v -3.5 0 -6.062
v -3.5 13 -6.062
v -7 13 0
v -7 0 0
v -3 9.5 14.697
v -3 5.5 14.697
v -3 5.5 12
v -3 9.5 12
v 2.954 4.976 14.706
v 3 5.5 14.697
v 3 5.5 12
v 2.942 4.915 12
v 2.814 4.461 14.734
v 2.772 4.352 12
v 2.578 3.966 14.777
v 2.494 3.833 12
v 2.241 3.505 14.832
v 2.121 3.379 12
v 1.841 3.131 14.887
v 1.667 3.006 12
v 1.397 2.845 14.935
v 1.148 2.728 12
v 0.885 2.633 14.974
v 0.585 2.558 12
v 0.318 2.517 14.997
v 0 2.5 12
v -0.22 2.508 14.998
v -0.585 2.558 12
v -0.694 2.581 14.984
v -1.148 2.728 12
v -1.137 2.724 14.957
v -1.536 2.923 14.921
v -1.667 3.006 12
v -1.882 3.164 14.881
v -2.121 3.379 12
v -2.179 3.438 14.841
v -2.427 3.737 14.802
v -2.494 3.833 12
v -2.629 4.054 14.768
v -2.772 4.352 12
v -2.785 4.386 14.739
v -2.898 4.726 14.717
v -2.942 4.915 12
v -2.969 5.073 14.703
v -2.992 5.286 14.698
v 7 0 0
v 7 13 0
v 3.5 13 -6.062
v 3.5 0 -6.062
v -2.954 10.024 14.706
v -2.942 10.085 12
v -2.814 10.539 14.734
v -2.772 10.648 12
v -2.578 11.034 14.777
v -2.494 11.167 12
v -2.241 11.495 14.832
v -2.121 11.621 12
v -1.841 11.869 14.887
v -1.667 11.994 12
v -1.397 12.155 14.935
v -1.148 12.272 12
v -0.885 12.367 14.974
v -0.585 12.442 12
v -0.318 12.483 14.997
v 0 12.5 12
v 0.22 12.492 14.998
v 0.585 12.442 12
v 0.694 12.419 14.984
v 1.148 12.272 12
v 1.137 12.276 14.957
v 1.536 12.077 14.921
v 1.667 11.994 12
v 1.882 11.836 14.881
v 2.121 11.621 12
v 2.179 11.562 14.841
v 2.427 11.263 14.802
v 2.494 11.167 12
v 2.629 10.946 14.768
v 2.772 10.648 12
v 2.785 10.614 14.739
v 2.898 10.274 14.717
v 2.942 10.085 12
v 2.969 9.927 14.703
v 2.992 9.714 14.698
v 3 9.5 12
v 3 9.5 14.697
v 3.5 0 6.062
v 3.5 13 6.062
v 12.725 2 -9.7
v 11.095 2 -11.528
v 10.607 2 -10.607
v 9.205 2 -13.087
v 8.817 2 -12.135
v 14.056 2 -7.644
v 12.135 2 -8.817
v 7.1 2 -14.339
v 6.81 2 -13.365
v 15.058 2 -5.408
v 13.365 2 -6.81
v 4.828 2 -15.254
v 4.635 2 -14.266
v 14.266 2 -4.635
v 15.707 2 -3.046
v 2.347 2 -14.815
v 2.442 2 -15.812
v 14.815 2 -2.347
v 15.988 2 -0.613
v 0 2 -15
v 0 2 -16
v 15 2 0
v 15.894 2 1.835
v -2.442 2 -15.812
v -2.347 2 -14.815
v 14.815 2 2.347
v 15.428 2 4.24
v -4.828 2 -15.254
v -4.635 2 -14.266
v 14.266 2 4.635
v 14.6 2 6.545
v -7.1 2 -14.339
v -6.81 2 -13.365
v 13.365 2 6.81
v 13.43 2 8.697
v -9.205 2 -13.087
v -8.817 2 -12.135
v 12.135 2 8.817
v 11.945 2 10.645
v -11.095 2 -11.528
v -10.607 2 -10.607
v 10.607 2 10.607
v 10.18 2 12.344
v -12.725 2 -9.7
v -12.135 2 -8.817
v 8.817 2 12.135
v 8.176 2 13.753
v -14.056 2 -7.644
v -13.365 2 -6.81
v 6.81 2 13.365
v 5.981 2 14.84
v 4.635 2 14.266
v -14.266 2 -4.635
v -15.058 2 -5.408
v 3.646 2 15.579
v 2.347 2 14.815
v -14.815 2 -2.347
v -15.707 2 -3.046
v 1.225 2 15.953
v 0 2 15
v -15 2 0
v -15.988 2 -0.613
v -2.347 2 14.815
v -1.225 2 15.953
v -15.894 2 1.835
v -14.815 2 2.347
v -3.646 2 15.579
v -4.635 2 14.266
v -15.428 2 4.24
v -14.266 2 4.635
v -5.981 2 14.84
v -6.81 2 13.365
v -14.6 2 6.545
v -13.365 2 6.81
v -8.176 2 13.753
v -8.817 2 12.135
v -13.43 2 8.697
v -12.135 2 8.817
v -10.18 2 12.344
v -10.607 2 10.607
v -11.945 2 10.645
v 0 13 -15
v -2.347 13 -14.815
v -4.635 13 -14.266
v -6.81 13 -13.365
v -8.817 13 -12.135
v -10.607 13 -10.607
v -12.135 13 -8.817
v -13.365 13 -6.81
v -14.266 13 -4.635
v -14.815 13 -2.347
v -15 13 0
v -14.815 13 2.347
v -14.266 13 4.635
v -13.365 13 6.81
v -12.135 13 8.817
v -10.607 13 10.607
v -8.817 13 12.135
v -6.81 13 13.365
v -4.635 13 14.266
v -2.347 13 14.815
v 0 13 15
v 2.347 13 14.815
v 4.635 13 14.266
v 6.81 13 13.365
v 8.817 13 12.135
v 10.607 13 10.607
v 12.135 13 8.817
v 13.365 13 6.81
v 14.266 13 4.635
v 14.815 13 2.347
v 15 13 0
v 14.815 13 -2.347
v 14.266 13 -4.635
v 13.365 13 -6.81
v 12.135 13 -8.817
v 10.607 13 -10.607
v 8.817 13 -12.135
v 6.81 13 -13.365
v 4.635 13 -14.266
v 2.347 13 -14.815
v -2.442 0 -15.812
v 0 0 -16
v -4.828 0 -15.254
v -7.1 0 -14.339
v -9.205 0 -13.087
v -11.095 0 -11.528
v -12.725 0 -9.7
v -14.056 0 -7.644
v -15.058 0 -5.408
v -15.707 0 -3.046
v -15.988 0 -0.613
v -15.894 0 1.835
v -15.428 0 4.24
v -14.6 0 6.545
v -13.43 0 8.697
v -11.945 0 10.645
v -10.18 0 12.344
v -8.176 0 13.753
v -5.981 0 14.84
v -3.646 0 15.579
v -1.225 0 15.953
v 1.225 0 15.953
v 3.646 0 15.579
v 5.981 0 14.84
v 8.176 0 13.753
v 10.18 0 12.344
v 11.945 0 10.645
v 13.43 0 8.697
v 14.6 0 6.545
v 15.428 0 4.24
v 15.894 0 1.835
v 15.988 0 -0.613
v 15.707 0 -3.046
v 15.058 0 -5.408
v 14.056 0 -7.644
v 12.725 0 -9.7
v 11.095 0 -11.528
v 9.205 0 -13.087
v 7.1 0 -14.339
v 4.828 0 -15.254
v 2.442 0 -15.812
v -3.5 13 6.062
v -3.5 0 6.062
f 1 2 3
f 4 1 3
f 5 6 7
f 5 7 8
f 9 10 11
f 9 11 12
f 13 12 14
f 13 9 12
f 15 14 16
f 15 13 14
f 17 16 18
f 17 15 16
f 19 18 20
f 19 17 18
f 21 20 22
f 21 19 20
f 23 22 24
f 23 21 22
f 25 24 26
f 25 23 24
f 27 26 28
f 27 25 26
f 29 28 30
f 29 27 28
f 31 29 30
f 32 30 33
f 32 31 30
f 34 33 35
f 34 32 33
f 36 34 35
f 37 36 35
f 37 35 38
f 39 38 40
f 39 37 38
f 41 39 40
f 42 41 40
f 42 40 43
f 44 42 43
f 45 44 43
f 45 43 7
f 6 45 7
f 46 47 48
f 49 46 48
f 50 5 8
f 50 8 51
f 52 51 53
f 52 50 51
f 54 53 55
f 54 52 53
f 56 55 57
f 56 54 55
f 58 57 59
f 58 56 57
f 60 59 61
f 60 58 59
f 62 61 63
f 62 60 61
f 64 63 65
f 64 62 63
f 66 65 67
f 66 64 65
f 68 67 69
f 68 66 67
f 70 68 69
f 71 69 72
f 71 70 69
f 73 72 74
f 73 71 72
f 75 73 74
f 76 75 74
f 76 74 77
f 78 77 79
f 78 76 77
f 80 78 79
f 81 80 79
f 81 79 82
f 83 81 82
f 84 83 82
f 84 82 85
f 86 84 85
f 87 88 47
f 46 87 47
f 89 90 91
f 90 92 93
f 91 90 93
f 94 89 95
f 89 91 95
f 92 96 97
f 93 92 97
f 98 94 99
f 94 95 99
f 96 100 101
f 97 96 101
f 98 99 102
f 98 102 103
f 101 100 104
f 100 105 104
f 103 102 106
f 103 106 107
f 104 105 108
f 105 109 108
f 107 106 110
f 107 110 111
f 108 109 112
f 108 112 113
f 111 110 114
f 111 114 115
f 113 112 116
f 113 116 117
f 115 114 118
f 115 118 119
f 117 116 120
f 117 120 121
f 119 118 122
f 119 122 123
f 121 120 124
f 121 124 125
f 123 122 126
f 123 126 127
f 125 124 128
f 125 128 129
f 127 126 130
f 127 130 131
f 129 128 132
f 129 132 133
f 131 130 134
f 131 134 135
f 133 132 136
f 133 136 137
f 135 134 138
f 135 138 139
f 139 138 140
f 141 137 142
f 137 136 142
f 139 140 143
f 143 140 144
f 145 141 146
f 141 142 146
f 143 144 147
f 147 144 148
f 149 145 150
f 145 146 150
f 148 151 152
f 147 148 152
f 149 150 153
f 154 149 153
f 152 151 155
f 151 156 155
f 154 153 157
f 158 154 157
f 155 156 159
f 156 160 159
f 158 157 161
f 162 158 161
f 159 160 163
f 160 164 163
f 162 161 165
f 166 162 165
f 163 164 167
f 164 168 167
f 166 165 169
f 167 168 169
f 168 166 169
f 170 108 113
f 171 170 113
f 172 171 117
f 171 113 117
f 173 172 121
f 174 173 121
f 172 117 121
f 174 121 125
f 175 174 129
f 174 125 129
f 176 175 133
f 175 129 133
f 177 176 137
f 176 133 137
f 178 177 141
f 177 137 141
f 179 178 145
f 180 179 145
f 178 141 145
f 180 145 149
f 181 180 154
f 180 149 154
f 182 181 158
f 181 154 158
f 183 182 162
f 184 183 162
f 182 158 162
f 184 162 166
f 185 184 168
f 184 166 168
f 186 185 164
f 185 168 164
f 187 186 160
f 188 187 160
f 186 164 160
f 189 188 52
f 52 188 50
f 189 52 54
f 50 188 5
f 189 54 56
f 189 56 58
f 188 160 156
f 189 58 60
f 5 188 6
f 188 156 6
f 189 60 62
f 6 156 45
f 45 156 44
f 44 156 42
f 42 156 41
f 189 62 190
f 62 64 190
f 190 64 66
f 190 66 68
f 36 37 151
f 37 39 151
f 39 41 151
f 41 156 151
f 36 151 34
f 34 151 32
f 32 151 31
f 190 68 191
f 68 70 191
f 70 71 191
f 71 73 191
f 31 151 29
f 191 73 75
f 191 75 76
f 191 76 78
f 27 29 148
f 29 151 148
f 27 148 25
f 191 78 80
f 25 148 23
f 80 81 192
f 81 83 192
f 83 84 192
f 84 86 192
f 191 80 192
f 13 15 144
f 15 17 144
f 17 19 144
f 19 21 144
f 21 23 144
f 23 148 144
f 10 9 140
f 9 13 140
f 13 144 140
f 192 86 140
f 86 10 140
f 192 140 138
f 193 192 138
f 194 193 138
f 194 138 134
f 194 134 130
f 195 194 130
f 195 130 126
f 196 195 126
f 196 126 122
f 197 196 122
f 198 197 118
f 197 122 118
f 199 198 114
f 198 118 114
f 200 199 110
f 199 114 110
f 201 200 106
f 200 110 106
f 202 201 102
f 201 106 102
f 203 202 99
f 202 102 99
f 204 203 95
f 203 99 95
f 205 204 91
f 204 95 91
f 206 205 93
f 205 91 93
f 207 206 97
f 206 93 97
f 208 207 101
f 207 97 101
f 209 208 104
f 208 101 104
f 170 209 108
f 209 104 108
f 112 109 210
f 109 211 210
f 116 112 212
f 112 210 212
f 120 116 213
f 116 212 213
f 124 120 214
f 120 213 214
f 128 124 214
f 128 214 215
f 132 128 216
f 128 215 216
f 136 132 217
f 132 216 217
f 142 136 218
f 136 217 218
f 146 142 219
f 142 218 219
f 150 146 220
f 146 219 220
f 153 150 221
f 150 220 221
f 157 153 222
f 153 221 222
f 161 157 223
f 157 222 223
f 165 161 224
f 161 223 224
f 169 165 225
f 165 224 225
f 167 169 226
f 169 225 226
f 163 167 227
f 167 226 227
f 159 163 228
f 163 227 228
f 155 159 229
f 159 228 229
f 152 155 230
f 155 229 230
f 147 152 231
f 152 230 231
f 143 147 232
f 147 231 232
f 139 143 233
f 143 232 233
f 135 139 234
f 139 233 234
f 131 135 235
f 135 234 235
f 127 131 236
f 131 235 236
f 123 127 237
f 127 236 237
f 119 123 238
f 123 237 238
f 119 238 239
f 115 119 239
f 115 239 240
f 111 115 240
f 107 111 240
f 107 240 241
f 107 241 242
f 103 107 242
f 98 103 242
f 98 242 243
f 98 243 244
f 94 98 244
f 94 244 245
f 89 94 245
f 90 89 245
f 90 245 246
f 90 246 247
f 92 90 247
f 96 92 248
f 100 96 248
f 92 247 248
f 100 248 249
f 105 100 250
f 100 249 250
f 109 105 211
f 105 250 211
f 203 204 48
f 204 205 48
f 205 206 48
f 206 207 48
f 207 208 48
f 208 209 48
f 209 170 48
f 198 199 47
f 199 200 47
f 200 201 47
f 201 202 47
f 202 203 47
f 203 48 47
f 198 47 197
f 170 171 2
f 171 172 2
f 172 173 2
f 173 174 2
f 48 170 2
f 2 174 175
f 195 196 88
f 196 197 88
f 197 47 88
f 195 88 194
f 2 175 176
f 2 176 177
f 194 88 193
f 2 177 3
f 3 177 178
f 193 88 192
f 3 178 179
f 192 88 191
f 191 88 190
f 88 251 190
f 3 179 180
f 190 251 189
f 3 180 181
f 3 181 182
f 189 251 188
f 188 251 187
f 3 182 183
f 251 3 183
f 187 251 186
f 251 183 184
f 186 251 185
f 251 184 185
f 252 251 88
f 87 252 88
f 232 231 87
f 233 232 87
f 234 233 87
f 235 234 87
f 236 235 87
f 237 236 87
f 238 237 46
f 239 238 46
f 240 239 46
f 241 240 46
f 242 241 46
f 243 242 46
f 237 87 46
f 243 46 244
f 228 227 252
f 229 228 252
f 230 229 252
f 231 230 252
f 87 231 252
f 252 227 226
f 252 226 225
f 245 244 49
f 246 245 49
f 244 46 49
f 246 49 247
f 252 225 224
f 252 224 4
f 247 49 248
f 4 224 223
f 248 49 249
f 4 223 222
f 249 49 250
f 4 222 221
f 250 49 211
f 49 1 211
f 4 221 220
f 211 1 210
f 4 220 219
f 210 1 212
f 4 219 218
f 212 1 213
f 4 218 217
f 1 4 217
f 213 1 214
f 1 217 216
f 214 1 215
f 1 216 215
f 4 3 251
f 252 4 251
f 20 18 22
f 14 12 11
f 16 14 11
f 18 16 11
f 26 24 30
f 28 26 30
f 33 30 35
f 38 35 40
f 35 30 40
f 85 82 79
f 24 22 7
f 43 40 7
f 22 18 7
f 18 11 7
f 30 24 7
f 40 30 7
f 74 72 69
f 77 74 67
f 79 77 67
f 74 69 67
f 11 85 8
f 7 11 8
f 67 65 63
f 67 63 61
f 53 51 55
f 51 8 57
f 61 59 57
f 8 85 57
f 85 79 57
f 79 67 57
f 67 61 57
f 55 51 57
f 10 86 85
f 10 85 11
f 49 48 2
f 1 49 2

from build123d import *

# Parameters (mm, degrees)
CUT_EXTRUDE1_DEPTH = 27.095976701
CUT_EXTRUDE2_DEPTH = 3


with BuildPart() as part:
    # Sketch1 → Revolve2 (revolve)
    with BuildSketch(Plane.XY, mode=Mode.PRIVATE) as revolve2_sk:
        Polygon((0, 13), (15, 13), (15, 2), (16, 2), (16, 0), (0, 0), align=None)
    revolve(revolve2_sk.sketch.rotate(Axis((0, 0, 0), (0, 1, 0)), 90), axis=Axis((0, 0, 0), (0, 1, 0)))

    # Sketch2 → Cut-Extrude1 (cut, through all)
    with BuildSketch(Plane(origin=(0, 13, 0), x_dir=(1, 0, 0), z_dir=(0, 1, 0))):
        Polygon((-7, 0), (-3.5, -6.062177826), (3.5, -6.062177826), (7, 0), (3.5, 6.062177826), (-3.5, 6.062177826), align=None)
    extrude(amount=-CUT_EXTRUDE1_DEPTH, mode=Mode.SUBTRACT)

    # Sketch4 → Cut-Extrude2 (cut)
    with BuildSketch(Plane.XY.offset(15)):
        with BuildLine():
            Line((3, 9.5), (3, 5.5))
            ThreePointArc((3, 5.5), (0, 2.5), (-3, 5.5))
            Line((-3, 5.5), (-3, 9.5))
            ThreePointArc((-3, 9.5), (0, 12.5), (3, 9.5))
        make_face()
    extrude(amount=-CUT_EXTRUDE2_DEPTH, mode=Mode.SUBTRACT)


solid = part.part
